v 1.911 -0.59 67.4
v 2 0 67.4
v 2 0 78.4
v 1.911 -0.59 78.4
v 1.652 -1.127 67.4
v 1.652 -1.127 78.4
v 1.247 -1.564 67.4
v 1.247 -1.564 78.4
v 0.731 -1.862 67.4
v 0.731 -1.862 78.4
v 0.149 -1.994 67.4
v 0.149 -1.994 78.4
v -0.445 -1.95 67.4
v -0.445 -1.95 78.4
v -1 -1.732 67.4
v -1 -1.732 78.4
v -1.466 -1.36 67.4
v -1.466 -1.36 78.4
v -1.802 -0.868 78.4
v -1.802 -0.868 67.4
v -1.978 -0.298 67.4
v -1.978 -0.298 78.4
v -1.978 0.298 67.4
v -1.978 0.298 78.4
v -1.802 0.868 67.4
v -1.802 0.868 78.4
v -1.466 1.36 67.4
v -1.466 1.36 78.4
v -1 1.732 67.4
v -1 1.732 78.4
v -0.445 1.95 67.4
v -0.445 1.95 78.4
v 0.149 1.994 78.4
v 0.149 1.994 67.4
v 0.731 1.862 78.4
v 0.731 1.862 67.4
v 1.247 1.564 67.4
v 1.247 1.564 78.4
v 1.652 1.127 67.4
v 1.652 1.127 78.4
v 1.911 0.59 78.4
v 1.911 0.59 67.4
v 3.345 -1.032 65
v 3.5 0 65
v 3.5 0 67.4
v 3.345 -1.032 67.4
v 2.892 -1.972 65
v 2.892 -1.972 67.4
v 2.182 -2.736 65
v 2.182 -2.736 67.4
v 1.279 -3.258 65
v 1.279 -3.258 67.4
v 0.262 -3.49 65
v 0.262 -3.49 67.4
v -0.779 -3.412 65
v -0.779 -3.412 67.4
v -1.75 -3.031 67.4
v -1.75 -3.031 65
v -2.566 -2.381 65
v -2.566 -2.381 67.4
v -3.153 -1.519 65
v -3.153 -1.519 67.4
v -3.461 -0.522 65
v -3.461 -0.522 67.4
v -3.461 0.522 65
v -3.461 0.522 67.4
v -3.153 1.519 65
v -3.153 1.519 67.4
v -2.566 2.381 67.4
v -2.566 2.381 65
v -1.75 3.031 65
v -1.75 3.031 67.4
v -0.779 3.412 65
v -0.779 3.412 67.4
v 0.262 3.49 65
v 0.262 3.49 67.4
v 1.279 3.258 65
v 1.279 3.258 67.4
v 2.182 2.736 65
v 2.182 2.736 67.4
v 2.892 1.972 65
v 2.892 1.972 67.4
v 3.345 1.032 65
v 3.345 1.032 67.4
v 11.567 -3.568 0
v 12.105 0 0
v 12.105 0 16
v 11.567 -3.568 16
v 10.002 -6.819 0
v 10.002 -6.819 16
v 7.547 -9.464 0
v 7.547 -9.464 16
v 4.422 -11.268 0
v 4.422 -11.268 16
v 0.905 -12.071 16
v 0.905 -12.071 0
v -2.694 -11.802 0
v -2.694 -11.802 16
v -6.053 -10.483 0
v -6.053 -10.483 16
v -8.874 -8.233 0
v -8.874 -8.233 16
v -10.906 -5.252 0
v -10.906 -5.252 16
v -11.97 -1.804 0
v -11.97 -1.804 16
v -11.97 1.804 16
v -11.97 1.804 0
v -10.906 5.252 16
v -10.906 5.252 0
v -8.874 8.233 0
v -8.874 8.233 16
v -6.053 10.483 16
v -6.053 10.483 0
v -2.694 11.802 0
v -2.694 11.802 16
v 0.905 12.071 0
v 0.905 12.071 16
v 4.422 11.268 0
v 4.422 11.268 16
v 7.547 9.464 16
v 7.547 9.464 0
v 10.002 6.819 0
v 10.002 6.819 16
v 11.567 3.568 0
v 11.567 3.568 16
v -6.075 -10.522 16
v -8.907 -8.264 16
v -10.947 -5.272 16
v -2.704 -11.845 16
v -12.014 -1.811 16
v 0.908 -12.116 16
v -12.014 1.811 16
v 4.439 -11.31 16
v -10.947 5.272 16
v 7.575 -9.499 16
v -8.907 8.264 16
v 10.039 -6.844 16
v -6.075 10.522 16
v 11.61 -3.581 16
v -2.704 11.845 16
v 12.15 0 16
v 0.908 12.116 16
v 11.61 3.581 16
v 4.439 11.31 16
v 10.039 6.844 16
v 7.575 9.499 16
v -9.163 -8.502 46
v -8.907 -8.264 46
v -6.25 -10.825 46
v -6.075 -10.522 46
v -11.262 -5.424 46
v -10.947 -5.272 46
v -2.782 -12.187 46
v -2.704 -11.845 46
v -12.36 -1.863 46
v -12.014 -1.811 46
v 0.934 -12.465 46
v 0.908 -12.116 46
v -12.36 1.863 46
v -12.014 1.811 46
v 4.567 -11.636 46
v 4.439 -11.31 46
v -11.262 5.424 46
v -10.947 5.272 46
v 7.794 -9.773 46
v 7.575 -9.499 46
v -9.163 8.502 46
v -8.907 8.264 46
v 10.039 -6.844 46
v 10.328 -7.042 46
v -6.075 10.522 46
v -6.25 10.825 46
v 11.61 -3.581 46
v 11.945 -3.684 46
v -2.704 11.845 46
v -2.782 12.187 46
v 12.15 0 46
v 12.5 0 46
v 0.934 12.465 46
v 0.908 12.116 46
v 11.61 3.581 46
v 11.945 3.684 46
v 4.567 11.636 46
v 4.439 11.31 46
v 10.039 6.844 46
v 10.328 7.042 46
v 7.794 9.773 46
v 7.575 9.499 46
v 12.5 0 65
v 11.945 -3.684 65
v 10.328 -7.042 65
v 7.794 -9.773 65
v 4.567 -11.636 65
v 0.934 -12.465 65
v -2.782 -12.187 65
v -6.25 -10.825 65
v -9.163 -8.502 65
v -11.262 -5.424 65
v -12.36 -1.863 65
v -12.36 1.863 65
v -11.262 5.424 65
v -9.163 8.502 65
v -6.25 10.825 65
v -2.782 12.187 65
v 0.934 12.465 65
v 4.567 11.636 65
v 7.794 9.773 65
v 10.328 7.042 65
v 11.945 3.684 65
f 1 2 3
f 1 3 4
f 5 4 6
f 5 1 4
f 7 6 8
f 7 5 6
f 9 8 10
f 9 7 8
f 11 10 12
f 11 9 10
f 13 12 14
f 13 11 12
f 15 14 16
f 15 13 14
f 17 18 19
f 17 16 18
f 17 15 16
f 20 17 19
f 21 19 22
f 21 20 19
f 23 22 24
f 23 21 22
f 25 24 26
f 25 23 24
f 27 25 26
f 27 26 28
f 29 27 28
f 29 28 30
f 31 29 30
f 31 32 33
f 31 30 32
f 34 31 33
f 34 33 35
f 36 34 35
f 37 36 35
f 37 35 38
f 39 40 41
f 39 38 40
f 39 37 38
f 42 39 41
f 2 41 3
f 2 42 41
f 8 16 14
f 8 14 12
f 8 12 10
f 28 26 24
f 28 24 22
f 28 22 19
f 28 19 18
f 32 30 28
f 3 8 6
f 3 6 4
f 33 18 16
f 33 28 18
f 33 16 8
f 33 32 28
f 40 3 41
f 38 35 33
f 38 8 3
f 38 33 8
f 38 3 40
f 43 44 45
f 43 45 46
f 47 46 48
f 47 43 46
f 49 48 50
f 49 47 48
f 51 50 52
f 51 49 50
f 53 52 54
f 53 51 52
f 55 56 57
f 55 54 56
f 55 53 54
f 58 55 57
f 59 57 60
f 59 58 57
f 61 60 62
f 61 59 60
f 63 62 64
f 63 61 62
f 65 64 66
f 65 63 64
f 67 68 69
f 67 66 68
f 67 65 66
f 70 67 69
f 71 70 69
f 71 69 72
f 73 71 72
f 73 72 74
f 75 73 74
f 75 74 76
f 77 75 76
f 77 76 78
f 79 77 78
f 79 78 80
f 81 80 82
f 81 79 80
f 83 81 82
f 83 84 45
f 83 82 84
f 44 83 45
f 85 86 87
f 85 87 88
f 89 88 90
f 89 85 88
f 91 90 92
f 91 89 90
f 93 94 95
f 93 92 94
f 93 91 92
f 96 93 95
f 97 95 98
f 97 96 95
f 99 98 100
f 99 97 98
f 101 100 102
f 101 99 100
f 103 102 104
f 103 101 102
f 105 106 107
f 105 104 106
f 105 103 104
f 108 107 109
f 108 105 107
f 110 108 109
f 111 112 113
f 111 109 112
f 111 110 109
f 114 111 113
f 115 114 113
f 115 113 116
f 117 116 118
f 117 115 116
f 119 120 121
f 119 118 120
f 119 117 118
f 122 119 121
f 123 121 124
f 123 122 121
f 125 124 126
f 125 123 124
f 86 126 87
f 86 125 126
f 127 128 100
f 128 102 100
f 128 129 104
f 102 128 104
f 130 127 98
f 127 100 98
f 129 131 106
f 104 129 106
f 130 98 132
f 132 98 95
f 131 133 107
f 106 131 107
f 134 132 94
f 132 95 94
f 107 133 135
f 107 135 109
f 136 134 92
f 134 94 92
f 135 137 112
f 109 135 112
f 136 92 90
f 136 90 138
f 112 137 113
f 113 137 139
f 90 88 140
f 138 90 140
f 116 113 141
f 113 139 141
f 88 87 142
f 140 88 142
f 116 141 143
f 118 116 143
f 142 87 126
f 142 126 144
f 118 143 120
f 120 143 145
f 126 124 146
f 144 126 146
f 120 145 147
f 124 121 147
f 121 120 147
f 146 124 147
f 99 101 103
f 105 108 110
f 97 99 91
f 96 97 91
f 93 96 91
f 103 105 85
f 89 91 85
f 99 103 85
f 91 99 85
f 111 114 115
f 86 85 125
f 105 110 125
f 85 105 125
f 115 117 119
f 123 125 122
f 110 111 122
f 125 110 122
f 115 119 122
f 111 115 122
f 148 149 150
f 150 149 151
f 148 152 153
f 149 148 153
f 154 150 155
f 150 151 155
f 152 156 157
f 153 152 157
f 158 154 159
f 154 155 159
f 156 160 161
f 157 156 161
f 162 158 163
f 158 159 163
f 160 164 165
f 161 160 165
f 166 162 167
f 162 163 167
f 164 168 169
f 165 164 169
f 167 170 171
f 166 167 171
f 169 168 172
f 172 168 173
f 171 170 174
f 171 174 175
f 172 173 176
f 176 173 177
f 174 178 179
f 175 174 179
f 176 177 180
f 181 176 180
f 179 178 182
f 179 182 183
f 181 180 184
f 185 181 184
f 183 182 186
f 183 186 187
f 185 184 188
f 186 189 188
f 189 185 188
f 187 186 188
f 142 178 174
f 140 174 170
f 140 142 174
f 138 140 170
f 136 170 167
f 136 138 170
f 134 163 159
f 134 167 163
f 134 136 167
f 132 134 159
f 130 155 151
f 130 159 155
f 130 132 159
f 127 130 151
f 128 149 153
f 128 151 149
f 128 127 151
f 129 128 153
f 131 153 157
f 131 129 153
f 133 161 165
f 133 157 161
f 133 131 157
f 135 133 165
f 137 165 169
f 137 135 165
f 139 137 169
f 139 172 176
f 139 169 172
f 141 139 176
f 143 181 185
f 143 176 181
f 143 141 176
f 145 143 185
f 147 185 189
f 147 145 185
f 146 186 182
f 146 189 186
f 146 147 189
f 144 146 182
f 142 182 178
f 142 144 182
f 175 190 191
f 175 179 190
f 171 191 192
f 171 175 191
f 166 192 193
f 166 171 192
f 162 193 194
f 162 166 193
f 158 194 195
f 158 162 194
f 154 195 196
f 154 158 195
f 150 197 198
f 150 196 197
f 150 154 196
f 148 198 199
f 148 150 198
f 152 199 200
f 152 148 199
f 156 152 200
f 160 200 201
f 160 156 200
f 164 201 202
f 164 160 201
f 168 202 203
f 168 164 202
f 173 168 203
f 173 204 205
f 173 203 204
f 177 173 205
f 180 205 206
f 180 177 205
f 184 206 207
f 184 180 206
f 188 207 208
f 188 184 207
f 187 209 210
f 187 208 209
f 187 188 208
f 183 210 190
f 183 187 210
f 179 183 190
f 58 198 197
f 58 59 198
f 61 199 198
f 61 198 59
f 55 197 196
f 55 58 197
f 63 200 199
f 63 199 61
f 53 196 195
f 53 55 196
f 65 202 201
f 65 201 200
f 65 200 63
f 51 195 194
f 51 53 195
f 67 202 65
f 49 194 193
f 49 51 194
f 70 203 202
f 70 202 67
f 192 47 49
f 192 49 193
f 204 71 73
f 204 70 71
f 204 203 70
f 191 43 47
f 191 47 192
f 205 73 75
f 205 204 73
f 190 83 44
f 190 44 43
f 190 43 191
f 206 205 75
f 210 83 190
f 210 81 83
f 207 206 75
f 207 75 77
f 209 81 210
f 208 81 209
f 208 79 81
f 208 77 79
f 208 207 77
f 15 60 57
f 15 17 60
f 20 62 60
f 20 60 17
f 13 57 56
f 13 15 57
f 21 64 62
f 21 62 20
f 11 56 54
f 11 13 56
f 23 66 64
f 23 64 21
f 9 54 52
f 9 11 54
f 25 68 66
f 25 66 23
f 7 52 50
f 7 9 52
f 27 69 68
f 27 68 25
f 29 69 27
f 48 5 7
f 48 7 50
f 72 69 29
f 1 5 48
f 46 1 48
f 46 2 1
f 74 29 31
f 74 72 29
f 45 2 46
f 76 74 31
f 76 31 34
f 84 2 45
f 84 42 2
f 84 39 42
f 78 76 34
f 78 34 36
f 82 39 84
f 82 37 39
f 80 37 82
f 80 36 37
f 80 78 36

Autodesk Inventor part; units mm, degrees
ref_plane "YZ Plane" through (0, 0, 0) normal (1, 0, 0) x (0, 1, 0)
ref_plane "XZ Plane" through (0, 0, 0) normal (0, 1, 0) x (-1, 0, 0)
ref_plane "XY Plane" through (0, 0, 0) normal (0, 0, 1) x (1, 0, 0)
sketch "Sketch1" plane through (0, 0, 0) normal (0, 0, 1) x (1, 0, 0)
  circle A0 centre (0, 0) radius 12.105
  dimension "d0" = 24.21
extrude "Extrusion1" add sketch "Sketch1" along normal blind 16
sketch "Sketch2" plane through (0, 0, 16) normal (0, 0, 1) x (1, 0, 0)
  circle A0 centre (0, 0) radius 12.15
  dimension "d14" = 24.3
extrude "Extrusion2" add sketch "Sketch2" along normal blind 30
sketch "Sketch3" plane through (0, 0, 46) normal (0, 0, 1) x (1, 0, 0)
  circle A0 centre (0, 0) radius 12.5
  dimension "d5" = 25
extrude "Extrusion3" add sketch "Sketch3" along normal blind 19
sketch "Sketch4" plane through (0, 0, 65) normal (0, 0, 1) x (1, 0, 0)
  circle A0 centre (0, 0) radius 3.5
  dimension "d8" = 7
extrude "Extrusion4" add sketch "Sketch4" along normal blind 2.4
sketch "Sketch5" plane through (0, 0, 67.4) normal (0, 0, 1) x (1, 0, 0)
  circle A0 centre (0, 0) radius 2
  dimension "d11" = 4
extrude "Extrusion5" add sketch "Sketch5" along normal blind 11
properties part number "gearmotor" material "ABS Plastic"
